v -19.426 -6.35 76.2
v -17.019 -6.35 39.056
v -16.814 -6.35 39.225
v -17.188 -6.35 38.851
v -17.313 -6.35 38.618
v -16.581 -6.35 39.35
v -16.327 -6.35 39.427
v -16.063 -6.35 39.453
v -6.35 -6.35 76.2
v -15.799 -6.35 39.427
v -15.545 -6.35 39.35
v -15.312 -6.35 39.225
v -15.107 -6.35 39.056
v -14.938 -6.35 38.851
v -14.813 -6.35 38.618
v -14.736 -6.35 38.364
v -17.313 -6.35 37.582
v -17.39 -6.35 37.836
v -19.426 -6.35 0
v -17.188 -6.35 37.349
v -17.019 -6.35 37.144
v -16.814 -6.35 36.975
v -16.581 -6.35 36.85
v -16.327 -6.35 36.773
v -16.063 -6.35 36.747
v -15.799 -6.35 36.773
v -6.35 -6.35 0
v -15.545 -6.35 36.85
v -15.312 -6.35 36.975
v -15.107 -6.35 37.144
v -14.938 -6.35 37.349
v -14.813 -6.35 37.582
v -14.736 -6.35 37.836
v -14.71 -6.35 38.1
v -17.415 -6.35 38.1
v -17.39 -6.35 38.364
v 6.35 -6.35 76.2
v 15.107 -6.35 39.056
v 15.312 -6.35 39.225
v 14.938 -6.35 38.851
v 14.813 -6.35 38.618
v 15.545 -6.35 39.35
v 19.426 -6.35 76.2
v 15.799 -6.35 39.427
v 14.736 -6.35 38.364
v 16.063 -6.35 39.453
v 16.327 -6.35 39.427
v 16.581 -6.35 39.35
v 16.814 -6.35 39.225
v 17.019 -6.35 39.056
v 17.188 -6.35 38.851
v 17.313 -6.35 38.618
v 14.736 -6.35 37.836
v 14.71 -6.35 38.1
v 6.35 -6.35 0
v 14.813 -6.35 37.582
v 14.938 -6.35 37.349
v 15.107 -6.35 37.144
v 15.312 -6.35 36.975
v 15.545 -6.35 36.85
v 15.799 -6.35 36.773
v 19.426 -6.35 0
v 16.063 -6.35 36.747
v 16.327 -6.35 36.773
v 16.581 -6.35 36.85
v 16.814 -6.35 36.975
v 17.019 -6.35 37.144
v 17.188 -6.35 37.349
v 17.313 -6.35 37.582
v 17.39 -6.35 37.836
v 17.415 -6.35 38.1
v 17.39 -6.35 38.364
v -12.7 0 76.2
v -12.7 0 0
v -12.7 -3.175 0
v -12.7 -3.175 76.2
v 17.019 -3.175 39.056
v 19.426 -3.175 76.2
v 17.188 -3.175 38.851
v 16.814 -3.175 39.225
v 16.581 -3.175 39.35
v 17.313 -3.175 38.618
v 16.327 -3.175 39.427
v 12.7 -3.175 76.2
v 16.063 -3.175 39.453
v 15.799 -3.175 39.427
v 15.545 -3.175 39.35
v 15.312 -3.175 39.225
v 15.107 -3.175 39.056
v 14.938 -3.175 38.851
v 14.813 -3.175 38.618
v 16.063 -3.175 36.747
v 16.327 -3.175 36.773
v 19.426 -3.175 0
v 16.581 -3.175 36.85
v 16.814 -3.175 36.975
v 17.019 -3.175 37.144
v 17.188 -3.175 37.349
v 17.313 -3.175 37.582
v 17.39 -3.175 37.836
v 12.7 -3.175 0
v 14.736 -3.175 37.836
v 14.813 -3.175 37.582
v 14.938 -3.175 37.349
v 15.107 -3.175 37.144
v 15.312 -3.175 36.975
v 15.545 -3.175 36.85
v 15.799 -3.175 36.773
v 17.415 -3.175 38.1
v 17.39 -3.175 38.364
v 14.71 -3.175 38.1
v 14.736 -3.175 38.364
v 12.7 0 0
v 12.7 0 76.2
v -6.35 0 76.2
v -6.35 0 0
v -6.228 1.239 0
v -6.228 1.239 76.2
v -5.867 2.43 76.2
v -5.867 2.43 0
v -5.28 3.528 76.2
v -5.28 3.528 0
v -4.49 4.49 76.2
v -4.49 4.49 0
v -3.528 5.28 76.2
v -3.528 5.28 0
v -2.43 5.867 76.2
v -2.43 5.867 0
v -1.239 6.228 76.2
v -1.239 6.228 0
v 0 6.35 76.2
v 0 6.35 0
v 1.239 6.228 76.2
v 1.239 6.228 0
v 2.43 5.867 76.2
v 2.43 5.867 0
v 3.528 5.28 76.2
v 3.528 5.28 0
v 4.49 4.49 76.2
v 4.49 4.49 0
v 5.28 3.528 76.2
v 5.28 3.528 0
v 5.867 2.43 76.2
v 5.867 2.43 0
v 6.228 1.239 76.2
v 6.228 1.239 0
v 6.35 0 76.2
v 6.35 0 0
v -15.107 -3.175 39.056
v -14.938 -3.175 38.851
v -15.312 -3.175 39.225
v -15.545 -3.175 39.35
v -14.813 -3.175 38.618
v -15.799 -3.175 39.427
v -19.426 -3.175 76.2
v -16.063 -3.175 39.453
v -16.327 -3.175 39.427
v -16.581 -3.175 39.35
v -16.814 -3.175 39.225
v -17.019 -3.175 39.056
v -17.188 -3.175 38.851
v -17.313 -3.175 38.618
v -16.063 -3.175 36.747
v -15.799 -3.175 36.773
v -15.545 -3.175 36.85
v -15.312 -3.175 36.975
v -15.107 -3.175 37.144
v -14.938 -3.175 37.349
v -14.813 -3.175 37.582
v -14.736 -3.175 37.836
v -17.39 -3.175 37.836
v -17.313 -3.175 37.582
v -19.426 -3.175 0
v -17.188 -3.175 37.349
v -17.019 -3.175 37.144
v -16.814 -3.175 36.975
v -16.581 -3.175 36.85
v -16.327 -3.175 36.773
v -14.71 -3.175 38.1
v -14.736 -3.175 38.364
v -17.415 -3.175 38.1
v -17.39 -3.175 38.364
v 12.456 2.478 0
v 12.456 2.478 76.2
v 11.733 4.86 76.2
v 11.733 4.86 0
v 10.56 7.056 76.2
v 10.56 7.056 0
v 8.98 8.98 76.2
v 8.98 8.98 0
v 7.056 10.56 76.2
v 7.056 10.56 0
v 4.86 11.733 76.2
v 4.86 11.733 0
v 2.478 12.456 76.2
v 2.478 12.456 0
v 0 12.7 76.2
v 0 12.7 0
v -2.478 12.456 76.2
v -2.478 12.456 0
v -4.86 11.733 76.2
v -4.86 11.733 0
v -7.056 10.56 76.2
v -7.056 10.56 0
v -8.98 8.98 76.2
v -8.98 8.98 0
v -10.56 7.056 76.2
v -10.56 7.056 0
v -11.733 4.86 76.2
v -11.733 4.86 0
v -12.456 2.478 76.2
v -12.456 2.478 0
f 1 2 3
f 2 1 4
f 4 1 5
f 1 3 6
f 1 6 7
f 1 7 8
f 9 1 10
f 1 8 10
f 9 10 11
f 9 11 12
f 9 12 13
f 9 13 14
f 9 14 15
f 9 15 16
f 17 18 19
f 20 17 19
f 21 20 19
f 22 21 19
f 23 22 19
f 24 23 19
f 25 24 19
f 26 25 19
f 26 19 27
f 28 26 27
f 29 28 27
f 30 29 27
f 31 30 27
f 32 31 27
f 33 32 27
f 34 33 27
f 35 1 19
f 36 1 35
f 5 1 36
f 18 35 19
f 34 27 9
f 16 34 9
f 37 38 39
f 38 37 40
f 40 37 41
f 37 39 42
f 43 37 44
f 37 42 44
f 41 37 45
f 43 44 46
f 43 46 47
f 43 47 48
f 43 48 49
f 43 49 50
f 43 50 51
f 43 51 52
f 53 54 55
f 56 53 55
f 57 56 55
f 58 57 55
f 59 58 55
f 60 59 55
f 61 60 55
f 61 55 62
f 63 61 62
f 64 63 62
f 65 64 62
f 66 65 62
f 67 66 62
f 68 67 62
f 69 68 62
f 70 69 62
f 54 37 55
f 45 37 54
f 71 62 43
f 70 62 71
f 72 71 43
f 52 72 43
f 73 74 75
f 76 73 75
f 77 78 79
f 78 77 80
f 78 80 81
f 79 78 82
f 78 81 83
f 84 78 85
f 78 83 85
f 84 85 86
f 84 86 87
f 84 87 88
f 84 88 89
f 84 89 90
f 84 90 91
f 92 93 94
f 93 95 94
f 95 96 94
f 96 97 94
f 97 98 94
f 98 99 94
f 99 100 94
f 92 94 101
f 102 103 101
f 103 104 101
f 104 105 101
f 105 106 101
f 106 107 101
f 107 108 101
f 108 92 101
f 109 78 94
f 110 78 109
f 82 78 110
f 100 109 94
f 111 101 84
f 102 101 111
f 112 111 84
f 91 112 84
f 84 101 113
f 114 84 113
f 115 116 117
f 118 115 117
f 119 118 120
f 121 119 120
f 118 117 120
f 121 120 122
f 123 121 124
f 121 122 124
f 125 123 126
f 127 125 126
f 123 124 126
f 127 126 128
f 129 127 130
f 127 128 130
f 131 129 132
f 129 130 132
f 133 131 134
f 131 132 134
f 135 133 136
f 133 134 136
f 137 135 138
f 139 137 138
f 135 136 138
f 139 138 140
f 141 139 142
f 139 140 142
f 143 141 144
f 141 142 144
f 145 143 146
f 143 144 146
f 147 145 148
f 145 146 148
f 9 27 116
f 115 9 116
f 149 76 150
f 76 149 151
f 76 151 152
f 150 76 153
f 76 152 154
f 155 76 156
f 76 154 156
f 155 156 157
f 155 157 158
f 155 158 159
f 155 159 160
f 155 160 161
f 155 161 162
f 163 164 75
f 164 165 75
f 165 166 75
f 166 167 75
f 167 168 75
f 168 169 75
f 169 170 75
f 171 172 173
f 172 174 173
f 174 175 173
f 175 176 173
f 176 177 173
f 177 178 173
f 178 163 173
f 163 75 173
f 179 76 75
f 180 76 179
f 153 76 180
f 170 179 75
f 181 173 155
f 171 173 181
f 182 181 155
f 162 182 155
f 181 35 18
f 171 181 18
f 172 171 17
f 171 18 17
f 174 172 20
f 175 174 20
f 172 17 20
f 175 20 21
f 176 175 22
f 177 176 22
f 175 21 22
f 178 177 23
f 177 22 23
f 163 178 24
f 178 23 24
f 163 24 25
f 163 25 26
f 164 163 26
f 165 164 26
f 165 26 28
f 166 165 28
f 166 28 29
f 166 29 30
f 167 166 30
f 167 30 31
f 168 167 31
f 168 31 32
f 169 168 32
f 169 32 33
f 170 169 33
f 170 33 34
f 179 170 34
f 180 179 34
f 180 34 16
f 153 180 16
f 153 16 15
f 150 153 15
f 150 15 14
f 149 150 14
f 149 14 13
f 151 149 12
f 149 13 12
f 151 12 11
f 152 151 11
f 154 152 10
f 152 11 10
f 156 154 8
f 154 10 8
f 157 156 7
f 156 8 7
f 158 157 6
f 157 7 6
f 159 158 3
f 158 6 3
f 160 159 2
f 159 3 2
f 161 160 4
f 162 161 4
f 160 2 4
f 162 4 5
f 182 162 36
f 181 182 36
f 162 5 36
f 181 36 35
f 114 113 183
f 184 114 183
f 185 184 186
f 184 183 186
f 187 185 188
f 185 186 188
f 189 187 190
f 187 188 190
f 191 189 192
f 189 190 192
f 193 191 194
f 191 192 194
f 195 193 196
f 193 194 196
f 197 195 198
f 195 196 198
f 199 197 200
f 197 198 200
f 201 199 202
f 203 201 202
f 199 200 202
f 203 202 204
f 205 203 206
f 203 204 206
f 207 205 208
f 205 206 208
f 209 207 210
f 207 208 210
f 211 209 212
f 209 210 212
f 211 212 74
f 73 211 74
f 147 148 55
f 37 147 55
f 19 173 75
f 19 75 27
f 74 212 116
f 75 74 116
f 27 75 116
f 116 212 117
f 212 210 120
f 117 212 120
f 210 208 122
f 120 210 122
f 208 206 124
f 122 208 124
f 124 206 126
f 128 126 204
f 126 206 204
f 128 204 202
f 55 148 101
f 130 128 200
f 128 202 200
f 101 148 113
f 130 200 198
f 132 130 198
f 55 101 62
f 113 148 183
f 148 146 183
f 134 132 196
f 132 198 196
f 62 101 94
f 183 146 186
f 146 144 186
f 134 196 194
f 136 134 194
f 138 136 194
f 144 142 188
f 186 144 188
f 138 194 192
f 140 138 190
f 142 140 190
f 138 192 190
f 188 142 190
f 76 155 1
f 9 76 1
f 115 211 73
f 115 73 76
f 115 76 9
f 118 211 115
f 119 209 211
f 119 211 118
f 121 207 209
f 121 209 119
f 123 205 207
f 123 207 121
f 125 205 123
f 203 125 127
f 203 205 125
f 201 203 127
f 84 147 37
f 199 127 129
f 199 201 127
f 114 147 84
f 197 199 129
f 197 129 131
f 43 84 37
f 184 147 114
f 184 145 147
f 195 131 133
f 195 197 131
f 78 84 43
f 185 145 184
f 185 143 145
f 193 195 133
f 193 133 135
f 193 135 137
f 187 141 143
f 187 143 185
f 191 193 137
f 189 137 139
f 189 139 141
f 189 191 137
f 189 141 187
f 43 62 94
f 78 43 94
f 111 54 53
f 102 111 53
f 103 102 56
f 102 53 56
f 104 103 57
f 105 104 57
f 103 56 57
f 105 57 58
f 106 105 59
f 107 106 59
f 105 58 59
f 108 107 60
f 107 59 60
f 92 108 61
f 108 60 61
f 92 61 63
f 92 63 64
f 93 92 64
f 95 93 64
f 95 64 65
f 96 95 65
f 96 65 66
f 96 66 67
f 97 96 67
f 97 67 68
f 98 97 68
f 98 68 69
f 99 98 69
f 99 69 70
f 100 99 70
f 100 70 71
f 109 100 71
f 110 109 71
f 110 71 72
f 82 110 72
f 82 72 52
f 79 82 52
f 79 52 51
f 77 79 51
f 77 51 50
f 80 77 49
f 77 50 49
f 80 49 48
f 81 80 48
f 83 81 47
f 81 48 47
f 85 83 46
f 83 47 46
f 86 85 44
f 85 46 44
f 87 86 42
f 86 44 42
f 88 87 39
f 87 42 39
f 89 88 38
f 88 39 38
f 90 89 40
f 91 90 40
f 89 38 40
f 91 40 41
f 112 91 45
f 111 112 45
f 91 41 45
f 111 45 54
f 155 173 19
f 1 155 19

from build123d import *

# Parameters (mm, degrees)
BOSS_EXTRUDE1_DEPTH       = 76.2
TAP_DRILL_FOR_6_32_TAP1_D = 2.7051


with BuildPart() as part:
    # Sketch2 → Boss-Extrude1 (new body)
    with BuildSketch(Plane.XY):
        with BuildLine():
            Line((-19.425899611, -6.35), (-6.35, -6.35))
            Line((-6.35, -6.35), (-6.35, 0))
            ThreePointArc((-6.35, 0), (0, 6.35), (6.35, 0))
            Line((6.35, 0), (6.35, -6.35))
            Line((6.35, -6.35), (19.425899611, -6.35))
            Line((19.425899611, -6.35), (19.425899611, -3.175))
            Line((19.425899611, -3.175), (12.7, -3.175))
            Line((12.7, -3.175), (12.7, 0))
            ThreePointArc((12.7, 0), (0, 12.7), (-12.7, 0))
            Line((-12.7, 0), (-12.7, -3.175))
            Line((-12.7, -3.175), (-19.425899611, -3.175))
            Line((-19.425899611, -3.175), (-19.425899611, -6.35))
        make_face()
    extrude(amount=BOSS_EXTRUDE1_DEPTH)

    # Tap Drill for #6-32 Tap1 (through all)
    with Locations(Plane(origin=(0, -3.175, 0), x_dir=(1, 0, 0), z_dir=(0, 1, 0))):
        with Locations((-16.062949805, -38.1), (16.062949805, -38.1)):
            Hole(TAP_DRILL_FOR_6_32_TAP1_D / 2)


solid = part.part
